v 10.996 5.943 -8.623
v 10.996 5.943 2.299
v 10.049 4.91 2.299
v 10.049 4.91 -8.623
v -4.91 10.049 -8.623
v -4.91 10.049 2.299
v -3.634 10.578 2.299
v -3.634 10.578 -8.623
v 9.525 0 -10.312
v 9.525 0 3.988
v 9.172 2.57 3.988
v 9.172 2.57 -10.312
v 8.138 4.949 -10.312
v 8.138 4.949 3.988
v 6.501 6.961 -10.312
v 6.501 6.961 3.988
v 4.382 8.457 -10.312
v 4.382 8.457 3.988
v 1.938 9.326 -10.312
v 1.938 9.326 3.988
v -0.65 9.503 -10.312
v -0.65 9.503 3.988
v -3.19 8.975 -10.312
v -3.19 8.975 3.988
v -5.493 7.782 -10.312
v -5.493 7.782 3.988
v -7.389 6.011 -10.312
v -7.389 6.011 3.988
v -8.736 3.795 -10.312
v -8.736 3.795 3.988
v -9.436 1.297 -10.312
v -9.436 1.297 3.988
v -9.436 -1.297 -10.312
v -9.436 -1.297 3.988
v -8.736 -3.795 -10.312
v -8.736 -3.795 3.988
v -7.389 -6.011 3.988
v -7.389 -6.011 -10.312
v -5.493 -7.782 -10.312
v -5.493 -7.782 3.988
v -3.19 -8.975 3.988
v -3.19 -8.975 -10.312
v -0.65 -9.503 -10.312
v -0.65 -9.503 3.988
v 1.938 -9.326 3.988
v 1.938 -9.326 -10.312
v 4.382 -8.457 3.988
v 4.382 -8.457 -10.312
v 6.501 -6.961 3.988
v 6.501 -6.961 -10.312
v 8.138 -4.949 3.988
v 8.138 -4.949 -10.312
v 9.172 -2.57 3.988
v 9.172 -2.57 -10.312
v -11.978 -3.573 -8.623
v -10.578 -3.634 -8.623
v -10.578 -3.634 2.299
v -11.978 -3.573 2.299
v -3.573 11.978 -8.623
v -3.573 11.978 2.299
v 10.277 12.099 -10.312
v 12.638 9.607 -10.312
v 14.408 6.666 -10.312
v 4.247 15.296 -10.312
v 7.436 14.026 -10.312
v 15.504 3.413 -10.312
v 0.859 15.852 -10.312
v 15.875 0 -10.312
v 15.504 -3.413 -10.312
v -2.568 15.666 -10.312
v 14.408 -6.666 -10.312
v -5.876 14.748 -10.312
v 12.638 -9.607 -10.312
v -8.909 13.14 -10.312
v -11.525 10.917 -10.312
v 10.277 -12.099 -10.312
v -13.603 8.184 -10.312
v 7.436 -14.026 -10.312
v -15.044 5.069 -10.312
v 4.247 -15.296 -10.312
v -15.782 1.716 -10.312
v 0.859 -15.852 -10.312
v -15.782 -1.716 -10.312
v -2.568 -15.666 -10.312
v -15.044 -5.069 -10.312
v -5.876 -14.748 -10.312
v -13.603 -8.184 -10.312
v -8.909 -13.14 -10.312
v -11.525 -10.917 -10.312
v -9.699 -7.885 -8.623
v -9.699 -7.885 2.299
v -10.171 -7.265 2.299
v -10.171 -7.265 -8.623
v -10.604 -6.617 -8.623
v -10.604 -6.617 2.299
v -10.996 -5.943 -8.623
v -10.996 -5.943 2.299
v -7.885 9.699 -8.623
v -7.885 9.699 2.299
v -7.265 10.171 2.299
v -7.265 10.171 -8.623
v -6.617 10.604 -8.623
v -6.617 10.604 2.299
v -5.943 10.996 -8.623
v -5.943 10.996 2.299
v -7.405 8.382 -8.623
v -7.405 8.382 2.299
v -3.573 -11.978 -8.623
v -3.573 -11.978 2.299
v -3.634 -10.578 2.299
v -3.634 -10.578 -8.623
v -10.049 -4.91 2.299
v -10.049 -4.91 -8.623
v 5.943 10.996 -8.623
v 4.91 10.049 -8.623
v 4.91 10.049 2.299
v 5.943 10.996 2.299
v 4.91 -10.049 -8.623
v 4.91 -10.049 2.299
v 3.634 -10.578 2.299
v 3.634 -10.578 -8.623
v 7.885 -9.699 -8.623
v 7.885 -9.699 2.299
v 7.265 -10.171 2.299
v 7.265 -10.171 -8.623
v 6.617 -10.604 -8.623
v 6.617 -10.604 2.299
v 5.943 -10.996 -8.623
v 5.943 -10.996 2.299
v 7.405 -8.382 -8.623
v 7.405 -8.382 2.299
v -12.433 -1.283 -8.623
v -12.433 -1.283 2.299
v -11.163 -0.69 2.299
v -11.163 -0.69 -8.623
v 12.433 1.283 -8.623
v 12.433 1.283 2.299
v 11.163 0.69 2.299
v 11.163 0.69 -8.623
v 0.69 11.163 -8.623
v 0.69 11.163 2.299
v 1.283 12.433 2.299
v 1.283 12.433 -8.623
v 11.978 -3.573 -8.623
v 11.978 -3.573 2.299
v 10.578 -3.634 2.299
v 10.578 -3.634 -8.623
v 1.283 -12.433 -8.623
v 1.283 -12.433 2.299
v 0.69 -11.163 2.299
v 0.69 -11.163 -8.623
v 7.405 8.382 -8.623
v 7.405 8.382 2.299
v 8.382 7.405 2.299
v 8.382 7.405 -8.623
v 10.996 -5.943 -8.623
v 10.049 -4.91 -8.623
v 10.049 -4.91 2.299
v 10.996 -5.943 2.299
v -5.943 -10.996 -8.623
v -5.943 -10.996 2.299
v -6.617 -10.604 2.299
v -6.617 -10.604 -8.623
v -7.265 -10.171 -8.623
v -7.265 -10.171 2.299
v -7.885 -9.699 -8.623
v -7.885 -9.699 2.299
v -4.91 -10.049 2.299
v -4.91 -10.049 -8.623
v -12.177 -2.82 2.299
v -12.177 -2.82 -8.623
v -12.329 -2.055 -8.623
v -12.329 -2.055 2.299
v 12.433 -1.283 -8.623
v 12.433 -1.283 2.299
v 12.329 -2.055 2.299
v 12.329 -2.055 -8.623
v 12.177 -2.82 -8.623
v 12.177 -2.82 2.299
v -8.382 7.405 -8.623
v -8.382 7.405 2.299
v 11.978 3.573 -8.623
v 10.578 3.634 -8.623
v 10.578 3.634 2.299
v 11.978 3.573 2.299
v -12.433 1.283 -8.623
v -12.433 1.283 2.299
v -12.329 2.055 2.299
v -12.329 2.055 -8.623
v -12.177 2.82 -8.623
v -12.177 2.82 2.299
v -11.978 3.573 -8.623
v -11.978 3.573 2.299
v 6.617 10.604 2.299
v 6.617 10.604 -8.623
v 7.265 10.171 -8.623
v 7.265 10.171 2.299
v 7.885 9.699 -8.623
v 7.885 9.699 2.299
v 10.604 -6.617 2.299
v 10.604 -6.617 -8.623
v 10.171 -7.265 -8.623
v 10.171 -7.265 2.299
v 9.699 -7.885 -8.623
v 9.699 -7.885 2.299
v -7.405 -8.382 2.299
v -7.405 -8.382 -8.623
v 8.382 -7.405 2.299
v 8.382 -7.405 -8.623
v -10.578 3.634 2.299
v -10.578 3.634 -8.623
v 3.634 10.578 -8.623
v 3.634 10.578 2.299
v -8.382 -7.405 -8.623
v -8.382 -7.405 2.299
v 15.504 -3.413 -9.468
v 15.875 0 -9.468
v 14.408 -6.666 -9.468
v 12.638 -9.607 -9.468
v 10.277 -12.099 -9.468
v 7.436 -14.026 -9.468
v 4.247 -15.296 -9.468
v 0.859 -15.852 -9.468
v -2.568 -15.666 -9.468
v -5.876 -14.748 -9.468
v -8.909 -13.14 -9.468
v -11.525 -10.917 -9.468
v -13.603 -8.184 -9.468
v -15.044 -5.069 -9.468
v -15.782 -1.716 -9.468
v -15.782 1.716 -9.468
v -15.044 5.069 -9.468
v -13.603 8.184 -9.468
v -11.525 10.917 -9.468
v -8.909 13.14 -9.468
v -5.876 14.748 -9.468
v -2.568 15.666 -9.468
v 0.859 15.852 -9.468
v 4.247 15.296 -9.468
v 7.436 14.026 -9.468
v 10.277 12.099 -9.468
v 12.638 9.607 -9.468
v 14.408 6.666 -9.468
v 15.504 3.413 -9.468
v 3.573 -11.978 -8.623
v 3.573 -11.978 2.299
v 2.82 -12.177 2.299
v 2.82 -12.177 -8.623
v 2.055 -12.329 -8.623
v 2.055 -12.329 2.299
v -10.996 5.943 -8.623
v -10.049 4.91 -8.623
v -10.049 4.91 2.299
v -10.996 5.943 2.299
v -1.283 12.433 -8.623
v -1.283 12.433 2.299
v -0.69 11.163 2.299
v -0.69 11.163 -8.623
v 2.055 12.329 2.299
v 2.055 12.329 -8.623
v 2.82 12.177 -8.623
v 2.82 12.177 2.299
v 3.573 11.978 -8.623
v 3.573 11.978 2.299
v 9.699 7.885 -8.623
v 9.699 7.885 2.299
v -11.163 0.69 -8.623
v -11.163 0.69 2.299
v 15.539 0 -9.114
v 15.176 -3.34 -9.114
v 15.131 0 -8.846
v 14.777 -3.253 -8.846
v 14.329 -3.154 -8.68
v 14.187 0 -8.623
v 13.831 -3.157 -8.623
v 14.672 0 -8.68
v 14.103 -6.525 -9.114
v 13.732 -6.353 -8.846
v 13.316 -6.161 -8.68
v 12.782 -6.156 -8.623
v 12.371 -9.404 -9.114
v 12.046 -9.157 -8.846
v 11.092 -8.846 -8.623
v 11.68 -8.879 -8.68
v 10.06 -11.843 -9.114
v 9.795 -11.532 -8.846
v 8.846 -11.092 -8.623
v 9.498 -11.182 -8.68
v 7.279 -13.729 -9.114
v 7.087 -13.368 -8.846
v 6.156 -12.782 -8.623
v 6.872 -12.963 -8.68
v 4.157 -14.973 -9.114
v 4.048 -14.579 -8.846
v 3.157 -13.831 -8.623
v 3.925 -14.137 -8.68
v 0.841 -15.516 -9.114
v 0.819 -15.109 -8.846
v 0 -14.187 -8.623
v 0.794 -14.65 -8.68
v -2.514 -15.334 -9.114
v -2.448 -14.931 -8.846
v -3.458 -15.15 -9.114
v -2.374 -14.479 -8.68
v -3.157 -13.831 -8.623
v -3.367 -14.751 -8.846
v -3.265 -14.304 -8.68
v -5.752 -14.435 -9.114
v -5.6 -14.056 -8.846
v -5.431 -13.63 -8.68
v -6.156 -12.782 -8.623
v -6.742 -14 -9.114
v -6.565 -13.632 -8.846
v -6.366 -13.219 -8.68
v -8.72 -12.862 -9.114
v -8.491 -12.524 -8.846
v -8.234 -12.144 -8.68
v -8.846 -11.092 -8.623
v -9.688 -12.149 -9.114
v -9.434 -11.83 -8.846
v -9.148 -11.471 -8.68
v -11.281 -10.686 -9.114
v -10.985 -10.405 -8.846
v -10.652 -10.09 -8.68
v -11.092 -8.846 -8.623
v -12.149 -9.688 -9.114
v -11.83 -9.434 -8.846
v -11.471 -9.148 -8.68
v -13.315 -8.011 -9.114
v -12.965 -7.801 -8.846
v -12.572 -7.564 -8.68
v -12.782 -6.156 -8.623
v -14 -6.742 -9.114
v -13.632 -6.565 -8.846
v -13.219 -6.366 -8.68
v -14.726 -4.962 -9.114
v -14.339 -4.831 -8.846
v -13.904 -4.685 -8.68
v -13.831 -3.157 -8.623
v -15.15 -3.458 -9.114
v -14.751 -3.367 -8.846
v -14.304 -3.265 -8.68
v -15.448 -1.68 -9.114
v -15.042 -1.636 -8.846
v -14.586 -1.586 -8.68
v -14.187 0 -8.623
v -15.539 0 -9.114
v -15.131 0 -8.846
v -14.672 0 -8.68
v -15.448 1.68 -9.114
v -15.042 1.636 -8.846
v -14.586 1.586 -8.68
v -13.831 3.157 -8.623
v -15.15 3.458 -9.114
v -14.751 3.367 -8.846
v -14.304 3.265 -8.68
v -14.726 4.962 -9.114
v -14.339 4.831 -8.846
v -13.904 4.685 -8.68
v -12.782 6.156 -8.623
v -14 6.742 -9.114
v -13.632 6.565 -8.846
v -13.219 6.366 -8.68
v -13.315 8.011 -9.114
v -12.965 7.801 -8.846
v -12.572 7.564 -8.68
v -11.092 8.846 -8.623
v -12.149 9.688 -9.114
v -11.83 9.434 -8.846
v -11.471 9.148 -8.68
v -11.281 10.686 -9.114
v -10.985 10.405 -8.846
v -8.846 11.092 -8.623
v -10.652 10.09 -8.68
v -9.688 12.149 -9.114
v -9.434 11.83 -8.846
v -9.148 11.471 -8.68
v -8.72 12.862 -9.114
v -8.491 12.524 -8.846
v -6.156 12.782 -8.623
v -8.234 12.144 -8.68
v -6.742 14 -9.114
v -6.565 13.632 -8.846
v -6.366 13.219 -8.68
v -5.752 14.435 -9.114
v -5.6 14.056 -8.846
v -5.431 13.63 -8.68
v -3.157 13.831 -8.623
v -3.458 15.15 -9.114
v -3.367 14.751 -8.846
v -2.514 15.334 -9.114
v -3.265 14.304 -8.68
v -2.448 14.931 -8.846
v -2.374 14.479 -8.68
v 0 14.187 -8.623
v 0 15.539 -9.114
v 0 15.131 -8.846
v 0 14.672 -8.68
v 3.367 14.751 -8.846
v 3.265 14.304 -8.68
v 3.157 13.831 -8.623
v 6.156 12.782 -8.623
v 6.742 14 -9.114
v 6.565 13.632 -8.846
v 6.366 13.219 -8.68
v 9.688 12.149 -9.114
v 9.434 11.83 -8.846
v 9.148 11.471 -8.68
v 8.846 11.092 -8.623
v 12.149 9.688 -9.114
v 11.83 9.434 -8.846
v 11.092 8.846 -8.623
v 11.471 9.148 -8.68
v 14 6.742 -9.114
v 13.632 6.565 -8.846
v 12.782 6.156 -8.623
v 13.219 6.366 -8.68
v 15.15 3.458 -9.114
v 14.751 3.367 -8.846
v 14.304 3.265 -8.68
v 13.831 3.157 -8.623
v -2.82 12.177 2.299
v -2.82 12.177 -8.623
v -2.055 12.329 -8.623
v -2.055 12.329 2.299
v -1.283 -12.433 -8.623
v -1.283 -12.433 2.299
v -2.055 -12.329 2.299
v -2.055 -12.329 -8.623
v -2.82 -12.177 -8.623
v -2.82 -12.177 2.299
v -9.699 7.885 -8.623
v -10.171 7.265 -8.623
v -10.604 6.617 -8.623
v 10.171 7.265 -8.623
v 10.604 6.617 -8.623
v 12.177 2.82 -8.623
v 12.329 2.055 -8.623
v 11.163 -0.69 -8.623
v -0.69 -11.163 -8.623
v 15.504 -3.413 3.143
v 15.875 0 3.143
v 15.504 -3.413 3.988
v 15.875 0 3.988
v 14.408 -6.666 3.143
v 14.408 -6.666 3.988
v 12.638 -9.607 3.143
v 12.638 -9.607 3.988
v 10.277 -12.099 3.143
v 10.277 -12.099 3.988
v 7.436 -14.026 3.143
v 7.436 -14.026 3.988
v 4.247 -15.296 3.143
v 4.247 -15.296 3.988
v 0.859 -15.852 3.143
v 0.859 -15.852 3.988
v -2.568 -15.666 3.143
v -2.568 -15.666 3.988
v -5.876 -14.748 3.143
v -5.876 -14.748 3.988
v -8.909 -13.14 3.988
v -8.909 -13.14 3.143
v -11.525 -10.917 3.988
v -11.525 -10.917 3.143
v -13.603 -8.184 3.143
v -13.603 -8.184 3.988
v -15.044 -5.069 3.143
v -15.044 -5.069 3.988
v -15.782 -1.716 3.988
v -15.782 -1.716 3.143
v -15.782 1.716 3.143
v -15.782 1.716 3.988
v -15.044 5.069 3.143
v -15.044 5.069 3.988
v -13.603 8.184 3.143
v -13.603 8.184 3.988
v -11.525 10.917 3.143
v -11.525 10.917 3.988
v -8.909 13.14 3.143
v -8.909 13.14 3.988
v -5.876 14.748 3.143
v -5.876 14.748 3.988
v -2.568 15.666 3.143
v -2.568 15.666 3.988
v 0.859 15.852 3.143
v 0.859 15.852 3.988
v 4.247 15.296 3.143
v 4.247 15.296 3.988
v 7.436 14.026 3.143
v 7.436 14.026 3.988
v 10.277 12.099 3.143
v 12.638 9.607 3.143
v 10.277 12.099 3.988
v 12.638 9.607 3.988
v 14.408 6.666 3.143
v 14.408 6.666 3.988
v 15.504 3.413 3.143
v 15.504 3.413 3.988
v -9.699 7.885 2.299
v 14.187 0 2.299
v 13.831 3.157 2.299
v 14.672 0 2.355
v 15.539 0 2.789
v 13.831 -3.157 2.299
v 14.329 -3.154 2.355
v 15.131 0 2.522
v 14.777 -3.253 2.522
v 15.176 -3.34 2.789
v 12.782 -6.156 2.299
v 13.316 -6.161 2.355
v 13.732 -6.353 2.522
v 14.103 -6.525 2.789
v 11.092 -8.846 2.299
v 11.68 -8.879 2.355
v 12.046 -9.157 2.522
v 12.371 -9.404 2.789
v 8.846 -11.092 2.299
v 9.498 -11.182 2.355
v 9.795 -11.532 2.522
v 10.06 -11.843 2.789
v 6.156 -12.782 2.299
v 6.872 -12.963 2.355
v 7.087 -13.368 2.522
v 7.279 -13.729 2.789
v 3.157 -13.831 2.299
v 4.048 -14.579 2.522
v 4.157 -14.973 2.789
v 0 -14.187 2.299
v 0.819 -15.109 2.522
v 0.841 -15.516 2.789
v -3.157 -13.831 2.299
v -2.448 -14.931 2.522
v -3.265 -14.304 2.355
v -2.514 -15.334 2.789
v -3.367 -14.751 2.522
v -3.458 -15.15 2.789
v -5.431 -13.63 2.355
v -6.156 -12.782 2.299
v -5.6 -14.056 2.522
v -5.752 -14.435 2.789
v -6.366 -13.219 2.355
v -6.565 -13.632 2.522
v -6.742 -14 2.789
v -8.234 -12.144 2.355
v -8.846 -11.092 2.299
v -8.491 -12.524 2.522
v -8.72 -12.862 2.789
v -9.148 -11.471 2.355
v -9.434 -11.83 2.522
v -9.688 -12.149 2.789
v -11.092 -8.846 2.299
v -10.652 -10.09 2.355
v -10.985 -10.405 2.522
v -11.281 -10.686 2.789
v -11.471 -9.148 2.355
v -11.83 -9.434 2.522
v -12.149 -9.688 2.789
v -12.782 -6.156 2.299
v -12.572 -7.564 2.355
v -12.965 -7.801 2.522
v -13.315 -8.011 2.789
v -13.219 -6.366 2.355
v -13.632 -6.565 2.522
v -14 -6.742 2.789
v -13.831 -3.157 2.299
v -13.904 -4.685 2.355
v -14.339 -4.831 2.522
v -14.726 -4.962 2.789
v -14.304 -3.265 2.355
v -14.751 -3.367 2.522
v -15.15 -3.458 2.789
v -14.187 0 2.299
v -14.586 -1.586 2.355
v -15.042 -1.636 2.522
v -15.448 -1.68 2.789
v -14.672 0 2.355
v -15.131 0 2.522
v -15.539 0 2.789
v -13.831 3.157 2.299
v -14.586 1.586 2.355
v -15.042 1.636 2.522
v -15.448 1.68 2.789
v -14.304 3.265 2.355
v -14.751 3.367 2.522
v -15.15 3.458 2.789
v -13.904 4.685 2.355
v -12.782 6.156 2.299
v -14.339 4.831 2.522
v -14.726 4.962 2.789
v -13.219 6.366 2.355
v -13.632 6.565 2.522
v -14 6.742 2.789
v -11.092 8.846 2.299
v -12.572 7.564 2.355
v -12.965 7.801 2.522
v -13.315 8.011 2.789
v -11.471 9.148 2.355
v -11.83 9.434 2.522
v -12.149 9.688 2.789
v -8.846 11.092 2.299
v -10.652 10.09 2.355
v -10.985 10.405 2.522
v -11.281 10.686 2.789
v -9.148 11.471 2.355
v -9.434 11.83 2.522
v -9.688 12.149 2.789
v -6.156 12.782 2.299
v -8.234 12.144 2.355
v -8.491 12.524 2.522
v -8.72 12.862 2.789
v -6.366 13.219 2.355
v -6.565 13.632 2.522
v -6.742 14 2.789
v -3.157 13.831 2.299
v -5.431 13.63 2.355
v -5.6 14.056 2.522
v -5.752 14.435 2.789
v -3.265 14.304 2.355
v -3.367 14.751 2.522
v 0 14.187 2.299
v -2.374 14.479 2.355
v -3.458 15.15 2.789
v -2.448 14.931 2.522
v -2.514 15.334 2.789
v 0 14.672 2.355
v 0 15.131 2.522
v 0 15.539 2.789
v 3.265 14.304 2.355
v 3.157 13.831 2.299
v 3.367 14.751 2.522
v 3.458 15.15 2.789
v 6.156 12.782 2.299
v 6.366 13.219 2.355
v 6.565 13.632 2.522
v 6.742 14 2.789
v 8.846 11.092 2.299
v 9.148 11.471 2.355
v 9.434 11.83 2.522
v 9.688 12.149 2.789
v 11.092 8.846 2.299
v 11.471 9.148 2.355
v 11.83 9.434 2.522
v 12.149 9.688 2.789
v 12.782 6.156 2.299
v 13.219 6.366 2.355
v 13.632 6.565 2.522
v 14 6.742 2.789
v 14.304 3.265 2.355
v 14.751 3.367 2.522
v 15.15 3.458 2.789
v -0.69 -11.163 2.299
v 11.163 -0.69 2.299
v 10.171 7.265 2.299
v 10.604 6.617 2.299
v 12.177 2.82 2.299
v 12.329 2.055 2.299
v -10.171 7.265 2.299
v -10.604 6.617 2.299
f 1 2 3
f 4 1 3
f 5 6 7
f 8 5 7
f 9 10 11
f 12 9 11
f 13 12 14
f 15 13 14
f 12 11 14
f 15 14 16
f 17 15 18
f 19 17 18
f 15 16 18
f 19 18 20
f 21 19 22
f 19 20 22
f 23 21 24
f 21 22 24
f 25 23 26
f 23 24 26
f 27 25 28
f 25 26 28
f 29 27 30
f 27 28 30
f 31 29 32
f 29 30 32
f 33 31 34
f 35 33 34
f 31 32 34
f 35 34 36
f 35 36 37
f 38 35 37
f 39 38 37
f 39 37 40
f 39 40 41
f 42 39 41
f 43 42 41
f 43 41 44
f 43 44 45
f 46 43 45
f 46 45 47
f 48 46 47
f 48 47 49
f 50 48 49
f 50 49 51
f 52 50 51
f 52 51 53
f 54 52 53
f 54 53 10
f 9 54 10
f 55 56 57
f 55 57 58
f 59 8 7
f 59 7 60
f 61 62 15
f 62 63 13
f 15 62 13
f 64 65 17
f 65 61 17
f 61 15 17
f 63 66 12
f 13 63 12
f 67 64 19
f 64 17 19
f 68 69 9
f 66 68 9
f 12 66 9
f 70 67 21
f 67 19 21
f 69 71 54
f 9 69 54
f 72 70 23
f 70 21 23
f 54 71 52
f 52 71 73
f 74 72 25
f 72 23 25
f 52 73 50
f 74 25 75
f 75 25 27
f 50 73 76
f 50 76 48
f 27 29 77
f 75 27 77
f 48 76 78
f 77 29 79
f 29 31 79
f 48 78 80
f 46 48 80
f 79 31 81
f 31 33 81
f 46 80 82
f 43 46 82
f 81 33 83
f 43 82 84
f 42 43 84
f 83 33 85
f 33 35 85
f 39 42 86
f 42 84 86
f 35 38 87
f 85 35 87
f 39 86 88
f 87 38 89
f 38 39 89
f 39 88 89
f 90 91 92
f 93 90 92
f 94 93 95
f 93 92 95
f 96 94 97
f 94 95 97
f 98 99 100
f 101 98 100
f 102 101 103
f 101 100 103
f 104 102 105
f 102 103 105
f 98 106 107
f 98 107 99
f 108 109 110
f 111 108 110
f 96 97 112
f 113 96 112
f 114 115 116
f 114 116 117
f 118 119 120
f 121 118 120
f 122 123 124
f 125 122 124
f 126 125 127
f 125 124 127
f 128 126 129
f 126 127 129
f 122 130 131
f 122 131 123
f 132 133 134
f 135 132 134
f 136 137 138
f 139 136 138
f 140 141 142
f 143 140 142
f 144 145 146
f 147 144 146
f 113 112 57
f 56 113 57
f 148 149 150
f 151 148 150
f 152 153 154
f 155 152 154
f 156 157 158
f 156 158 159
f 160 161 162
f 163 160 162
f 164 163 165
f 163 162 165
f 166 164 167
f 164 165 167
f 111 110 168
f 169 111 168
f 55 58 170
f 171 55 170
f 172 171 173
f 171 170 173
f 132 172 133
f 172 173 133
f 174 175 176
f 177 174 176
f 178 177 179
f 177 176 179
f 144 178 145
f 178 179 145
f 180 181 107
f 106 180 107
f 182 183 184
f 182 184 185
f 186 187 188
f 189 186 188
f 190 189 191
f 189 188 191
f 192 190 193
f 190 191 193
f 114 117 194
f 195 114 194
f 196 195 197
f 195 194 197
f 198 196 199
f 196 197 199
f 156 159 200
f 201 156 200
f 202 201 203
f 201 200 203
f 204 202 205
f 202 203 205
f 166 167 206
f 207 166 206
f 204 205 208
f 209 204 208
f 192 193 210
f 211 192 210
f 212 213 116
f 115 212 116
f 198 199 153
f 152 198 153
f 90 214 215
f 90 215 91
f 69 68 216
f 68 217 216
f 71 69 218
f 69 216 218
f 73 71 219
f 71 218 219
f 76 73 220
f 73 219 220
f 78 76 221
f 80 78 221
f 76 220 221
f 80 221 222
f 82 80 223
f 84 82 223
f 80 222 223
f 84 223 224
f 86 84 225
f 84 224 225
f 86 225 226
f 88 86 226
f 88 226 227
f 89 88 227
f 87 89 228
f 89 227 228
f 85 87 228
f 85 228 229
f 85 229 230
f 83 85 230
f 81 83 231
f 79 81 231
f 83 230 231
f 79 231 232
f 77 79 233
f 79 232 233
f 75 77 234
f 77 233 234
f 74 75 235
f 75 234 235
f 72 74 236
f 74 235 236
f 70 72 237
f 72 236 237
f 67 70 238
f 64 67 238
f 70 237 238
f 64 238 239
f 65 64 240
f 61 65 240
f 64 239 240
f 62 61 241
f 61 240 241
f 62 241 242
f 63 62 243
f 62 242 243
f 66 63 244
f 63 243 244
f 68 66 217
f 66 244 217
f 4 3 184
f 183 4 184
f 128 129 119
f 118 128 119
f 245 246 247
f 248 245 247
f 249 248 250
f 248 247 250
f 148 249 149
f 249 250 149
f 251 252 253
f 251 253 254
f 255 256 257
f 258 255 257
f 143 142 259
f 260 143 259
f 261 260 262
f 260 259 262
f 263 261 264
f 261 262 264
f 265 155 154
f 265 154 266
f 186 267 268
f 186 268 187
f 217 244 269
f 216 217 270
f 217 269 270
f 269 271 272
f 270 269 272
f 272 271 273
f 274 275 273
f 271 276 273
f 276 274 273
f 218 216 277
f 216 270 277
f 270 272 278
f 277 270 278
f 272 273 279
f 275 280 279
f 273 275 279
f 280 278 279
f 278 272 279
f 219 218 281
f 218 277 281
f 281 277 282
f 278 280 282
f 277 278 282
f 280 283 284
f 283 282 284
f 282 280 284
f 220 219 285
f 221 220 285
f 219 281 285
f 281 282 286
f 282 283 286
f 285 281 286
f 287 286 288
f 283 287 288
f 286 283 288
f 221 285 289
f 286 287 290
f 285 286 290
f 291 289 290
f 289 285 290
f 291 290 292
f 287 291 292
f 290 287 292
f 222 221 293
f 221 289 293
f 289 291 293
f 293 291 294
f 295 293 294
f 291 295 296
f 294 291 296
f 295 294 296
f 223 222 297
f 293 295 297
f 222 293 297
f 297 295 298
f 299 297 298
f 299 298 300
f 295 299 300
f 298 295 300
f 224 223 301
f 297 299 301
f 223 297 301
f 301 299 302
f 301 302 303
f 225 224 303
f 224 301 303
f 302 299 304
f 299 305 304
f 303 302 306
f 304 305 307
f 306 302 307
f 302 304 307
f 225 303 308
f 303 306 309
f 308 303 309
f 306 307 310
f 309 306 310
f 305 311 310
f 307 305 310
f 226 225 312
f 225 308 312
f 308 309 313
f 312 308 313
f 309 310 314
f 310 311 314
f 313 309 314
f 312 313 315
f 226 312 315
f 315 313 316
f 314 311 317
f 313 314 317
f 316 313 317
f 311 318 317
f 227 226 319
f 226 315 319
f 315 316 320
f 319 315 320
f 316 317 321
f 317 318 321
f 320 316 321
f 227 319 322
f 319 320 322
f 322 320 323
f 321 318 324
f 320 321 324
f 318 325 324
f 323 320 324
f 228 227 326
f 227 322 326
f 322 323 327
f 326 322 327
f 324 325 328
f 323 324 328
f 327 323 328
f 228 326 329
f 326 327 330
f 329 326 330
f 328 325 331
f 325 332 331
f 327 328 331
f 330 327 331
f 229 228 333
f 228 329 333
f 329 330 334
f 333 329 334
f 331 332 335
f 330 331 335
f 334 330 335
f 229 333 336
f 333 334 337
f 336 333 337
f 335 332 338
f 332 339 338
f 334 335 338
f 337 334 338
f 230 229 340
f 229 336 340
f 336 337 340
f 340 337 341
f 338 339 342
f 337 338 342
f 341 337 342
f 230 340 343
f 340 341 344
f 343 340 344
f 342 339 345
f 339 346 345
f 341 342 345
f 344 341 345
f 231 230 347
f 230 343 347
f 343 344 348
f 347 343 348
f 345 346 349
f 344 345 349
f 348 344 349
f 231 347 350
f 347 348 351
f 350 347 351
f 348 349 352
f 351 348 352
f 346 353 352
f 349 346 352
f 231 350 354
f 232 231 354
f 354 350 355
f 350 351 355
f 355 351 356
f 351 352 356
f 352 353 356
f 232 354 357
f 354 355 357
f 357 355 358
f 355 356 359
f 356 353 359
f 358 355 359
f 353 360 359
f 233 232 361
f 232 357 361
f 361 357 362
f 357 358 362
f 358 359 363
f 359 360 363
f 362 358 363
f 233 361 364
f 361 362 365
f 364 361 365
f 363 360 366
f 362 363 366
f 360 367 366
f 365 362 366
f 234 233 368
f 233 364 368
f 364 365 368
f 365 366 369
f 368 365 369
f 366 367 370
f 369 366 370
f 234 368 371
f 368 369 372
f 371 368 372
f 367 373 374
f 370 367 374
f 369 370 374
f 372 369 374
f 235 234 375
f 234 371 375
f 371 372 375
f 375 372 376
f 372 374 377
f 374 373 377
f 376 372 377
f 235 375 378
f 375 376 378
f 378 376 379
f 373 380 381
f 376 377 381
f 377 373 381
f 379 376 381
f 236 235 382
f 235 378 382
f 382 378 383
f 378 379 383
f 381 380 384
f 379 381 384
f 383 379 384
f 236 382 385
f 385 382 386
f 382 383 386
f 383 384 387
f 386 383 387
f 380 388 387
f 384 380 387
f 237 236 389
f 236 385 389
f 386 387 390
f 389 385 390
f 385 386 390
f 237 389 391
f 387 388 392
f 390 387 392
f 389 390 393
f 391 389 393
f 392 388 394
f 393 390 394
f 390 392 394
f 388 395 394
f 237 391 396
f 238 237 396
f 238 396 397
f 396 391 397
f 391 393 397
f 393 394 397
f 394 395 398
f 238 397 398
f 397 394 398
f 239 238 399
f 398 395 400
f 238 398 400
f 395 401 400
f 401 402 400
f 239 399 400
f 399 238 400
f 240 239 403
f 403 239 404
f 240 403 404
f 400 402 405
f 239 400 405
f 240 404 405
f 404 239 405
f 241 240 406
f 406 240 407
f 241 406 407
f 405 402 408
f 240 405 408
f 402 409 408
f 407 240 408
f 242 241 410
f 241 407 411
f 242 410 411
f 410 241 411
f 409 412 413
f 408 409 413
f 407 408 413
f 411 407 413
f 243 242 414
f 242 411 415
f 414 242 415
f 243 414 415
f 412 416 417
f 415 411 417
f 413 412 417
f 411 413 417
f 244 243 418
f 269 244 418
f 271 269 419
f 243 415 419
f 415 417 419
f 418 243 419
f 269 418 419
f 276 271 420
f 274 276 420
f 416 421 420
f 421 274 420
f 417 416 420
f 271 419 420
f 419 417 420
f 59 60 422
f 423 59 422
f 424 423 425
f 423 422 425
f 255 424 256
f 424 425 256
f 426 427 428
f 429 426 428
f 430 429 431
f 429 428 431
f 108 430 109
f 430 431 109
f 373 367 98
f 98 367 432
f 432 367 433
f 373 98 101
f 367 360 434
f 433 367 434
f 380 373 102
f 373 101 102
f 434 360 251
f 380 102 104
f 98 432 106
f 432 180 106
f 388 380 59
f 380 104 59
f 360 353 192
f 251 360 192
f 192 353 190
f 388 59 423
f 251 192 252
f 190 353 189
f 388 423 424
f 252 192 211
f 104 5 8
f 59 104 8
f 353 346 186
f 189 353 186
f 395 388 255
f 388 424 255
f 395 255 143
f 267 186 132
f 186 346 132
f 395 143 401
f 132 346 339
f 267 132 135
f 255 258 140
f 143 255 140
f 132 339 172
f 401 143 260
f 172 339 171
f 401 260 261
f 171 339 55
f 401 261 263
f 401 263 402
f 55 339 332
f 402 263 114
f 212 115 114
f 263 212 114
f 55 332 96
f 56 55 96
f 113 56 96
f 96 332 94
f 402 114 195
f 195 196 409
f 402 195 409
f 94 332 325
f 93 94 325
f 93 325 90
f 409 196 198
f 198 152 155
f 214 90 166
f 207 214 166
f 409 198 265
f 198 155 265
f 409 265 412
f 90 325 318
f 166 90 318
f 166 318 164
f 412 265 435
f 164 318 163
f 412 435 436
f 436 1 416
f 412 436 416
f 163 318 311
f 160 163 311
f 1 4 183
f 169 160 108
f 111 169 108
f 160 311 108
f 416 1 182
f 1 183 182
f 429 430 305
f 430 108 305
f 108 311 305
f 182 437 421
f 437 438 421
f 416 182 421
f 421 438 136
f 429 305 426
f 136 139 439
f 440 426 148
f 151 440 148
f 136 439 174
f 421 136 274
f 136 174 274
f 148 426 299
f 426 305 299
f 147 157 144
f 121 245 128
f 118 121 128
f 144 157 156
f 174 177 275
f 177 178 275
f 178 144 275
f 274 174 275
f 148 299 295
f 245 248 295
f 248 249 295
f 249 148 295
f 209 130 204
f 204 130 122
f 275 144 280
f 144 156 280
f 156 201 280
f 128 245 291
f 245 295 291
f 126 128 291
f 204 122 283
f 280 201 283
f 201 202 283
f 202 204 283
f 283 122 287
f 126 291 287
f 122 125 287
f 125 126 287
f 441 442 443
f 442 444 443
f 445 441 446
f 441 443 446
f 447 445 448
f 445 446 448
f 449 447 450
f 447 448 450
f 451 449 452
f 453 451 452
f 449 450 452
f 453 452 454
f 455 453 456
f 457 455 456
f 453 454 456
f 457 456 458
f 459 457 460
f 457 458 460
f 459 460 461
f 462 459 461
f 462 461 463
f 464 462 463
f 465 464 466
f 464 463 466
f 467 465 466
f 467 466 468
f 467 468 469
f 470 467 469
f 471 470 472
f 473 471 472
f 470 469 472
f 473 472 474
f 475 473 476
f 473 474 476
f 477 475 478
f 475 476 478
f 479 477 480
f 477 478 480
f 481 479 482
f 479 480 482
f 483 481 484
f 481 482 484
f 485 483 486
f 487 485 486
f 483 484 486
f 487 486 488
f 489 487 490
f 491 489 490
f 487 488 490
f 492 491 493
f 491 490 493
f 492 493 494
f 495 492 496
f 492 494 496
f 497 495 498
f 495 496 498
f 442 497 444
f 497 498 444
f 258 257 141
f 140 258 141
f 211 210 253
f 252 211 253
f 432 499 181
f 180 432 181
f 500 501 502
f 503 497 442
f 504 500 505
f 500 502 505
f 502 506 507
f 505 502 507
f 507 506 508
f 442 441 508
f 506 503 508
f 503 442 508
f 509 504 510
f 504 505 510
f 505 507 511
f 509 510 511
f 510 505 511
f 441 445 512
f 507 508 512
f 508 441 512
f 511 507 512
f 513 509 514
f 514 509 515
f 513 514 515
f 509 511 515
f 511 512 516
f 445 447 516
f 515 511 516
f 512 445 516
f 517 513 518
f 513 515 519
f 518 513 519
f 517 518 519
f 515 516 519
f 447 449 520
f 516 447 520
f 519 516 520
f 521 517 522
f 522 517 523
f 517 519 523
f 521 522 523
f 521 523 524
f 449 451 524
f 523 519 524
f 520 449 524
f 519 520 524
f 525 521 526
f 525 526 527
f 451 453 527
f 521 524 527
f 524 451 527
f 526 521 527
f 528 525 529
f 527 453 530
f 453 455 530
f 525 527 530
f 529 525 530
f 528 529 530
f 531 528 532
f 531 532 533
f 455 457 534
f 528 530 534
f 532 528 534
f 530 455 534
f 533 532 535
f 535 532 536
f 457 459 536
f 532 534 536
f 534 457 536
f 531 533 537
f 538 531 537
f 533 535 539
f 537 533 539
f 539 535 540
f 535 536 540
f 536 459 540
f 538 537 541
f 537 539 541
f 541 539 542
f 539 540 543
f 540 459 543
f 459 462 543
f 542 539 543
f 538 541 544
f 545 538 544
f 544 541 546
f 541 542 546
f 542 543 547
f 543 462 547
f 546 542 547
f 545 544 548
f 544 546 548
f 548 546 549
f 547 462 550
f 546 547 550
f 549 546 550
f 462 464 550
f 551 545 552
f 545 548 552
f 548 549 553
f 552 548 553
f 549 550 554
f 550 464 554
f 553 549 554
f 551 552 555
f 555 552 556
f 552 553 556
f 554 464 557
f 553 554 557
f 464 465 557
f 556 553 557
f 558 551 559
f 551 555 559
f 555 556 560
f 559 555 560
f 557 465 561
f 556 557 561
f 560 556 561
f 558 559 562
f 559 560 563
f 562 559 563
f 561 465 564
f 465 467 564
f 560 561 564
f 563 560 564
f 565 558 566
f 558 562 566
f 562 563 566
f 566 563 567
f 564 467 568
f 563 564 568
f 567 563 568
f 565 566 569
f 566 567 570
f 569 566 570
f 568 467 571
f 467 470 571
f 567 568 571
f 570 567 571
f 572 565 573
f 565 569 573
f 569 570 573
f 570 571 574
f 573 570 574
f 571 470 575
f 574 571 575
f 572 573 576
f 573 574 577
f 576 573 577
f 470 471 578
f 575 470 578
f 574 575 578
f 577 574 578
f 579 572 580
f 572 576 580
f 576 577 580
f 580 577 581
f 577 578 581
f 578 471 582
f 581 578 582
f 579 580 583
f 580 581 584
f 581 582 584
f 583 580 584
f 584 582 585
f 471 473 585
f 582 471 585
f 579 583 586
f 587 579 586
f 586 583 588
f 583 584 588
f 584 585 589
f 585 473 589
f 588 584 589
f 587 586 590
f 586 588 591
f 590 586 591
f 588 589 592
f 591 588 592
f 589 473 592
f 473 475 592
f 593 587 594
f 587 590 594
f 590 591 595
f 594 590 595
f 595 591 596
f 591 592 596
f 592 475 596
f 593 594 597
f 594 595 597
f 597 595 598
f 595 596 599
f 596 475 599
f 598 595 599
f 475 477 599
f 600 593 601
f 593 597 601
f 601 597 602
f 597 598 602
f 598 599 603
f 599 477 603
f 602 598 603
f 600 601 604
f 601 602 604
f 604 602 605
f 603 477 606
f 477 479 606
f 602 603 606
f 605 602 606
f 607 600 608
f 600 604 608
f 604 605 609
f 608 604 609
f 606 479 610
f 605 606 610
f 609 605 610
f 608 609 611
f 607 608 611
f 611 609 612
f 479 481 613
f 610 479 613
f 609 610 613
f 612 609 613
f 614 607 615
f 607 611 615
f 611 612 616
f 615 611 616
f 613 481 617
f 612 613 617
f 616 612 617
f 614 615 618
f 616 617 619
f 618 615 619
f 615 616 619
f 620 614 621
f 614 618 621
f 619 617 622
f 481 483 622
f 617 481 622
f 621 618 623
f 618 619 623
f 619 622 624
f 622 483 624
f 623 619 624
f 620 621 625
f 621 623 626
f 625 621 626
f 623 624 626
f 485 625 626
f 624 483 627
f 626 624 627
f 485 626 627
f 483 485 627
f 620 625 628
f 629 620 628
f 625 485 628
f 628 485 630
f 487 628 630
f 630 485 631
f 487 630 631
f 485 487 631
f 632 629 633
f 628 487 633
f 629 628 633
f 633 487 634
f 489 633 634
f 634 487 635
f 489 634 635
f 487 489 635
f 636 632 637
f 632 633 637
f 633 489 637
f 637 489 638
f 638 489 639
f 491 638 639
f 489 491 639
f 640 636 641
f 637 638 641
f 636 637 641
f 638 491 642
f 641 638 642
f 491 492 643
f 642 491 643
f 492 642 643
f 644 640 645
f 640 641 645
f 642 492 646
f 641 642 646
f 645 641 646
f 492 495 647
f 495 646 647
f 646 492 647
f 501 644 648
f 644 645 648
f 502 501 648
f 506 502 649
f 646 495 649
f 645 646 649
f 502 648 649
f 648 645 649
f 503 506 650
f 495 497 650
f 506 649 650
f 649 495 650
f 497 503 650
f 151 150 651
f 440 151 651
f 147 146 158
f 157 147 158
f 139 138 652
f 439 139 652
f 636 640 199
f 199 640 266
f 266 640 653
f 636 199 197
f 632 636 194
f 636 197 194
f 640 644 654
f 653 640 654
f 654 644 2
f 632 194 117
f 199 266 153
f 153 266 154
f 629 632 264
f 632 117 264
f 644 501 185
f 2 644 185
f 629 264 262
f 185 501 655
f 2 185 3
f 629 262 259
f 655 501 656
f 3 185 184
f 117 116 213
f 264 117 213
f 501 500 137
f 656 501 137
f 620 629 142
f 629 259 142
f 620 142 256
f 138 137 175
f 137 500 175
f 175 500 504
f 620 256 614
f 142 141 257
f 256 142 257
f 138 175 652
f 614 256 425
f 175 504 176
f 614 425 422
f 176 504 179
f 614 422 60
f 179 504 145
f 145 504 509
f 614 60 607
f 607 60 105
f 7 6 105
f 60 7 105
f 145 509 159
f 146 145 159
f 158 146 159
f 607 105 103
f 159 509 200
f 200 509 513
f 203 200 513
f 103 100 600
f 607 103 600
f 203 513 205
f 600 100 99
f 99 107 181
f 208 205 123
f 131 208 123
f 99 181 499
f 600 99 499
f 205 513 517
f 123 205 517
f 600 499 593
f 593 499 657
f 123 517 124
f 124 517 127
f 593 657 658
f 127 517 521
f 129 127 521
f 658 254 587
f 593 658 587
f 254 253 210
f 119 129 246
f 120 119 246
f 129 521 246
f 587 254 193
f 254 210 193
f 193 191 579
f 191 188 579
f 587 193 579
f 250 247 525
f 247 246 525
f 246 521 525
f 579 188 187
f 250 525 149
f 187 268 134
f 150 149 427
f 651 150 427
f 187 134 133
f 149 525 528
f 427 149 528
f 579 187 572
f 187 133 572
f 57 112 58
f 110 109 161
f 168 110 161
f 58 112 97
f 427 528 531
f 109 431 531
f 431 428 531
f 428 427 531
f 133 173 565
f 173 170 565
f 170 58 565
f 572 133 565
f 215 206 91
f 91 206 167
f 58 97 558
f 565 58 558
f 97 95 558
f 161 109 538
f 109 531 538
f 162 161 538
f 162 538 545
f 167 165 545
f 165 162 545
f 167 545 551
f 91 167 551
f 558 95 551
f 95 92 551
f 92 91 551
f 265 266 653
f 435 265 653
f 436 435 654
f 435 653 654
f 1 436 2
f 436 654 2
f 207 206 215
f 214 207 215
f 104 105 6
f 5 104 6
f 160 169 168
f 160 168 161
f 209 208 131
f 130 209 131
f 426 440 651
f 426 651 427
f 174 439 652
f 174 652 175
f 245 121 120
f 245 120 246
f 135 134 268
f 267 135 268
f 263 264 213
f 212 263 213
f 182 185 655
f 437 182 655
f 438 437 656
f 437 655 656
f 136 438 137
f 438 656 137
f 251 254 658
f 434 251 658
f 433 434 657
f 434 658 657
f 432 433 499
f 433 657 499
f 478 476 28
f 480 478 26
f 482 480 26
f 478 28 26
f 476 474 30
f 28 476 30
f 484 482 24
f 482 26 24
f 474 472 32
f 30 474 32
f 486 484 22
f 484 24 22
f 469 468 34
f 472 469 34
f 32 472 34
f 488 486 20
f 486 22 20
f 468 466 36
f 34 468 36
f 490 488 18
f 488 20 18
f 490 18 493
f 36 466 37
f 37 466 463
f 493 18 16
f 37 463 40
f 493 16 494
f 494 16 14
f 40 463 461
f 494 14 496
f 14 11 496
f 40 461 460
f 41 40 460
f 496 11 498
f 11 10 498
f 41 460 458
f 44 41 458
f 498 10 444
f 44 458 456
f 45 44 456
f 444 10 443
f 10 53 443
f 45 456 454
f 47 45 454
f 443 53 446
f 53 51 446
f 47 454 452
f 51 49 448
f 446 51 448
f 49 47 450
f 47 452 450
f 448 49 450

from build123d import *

# Parameters (mm, degrees)
CUT_EXTRUDE1_START = 2.2987
CUT_EXTRUDE1_DEPTH = 10.922
CIRPATTERN1_COUNT  = 16
SKETCH8_R          = 9.525
CUT_EXTRUDE2_DEPTH = 27.618169923


with BuildPart() as part:
    # Sketch2 → Revolve1 (revolve)
    with BuildSketch(Plane(origin=(0, 0, 0), x_dir=(0, 0, -1), z_dir=(1, 0, 0)), mode=Mode.PRIVATE) as revolve1_sk:
        with BuildLine():
            Line((-3.9878, 3.175), (10.3124, 3.175))
            Line((10.3124, 3.175), (10.3124, 15.875))
            Line((10.3124, 15.875), (9.46785, 15.875))
            ThreePointArc((9.46785, 15.875), (8.846219323, 15.130824061), (8.6233, 14.187145354))
            Line((8.6233, 14.187145354), (8.6233, 12.499290707))
            Line((8.6233, 12.499290707), (-2.2987, 12.499290707))
            Line((-2.2987, 12.499290707), (-2.2987, 14.187145354))
            ThreePointArc((-2.2987, 14.187145354), (-2.521619323, 15.130824061), (-3.14325, 15.875))
            Line((-3.14325, 15.875), (-3.9878, 15.875))
            Line((-3.9878, 15.875), (-3.9878, 8.7376))
            Line((-3.9878, 8.7376), (-3.9878, 3.175))
        make_face()
    revolve(revolve1_sk.sketch.rotate(Axis((0, 0, 10.3124), (0, 0, -1)), 90), axis=Axis((0, 0, 10.3124), (0, 0, -1)))

    # Sketch3 → Cut-Extrude1 (cut)
    with BuildSketch(Plane.XY.offset(CUT_EXTRUDE1_START)):
        with BuildLine():
            Line((-0.690489274, 11.1633), (0.690489274, 11.1633))
            Line((0.690489274, 11.1633), (1.2827, 12.4333))
            ThreePointArc((1.2827, 12.4333), (0, 12.499290707), (-1.2827, 12.4333))
            Line((-1.2827, 12.4333), (-0.690489274, 11.1633))
        make_face()
    cut_extrude1 = extrude(amount=-CUT_EXTRUDE1_DEPTH, mode=Mode.SUBTRACT)

    # CirPattern1: Cut-Extrude1 ×16 about axis
    cirpattern1_axis = Axis((0, 0, 0), (0, 0, 1))
    for i in range(1, CIRPATTERN1_COUNT):
        add(cut_extrude1.rotate(cirpattern1_axis, i * 360 / CIRPATTERN1_COUNT), mode=Mode.SUBTRACT)

    # Sketch8 → Cut-Extrude2 (cut, through all)
    with BuildSketch(Plane.XY.offset(3.9878)):
        Circle(SKETCH8_R)
    extrude(amount=-CUT_EXTRUDE2_DEPTH, mode=Mode.SUBTRACT)


solid = part.part
